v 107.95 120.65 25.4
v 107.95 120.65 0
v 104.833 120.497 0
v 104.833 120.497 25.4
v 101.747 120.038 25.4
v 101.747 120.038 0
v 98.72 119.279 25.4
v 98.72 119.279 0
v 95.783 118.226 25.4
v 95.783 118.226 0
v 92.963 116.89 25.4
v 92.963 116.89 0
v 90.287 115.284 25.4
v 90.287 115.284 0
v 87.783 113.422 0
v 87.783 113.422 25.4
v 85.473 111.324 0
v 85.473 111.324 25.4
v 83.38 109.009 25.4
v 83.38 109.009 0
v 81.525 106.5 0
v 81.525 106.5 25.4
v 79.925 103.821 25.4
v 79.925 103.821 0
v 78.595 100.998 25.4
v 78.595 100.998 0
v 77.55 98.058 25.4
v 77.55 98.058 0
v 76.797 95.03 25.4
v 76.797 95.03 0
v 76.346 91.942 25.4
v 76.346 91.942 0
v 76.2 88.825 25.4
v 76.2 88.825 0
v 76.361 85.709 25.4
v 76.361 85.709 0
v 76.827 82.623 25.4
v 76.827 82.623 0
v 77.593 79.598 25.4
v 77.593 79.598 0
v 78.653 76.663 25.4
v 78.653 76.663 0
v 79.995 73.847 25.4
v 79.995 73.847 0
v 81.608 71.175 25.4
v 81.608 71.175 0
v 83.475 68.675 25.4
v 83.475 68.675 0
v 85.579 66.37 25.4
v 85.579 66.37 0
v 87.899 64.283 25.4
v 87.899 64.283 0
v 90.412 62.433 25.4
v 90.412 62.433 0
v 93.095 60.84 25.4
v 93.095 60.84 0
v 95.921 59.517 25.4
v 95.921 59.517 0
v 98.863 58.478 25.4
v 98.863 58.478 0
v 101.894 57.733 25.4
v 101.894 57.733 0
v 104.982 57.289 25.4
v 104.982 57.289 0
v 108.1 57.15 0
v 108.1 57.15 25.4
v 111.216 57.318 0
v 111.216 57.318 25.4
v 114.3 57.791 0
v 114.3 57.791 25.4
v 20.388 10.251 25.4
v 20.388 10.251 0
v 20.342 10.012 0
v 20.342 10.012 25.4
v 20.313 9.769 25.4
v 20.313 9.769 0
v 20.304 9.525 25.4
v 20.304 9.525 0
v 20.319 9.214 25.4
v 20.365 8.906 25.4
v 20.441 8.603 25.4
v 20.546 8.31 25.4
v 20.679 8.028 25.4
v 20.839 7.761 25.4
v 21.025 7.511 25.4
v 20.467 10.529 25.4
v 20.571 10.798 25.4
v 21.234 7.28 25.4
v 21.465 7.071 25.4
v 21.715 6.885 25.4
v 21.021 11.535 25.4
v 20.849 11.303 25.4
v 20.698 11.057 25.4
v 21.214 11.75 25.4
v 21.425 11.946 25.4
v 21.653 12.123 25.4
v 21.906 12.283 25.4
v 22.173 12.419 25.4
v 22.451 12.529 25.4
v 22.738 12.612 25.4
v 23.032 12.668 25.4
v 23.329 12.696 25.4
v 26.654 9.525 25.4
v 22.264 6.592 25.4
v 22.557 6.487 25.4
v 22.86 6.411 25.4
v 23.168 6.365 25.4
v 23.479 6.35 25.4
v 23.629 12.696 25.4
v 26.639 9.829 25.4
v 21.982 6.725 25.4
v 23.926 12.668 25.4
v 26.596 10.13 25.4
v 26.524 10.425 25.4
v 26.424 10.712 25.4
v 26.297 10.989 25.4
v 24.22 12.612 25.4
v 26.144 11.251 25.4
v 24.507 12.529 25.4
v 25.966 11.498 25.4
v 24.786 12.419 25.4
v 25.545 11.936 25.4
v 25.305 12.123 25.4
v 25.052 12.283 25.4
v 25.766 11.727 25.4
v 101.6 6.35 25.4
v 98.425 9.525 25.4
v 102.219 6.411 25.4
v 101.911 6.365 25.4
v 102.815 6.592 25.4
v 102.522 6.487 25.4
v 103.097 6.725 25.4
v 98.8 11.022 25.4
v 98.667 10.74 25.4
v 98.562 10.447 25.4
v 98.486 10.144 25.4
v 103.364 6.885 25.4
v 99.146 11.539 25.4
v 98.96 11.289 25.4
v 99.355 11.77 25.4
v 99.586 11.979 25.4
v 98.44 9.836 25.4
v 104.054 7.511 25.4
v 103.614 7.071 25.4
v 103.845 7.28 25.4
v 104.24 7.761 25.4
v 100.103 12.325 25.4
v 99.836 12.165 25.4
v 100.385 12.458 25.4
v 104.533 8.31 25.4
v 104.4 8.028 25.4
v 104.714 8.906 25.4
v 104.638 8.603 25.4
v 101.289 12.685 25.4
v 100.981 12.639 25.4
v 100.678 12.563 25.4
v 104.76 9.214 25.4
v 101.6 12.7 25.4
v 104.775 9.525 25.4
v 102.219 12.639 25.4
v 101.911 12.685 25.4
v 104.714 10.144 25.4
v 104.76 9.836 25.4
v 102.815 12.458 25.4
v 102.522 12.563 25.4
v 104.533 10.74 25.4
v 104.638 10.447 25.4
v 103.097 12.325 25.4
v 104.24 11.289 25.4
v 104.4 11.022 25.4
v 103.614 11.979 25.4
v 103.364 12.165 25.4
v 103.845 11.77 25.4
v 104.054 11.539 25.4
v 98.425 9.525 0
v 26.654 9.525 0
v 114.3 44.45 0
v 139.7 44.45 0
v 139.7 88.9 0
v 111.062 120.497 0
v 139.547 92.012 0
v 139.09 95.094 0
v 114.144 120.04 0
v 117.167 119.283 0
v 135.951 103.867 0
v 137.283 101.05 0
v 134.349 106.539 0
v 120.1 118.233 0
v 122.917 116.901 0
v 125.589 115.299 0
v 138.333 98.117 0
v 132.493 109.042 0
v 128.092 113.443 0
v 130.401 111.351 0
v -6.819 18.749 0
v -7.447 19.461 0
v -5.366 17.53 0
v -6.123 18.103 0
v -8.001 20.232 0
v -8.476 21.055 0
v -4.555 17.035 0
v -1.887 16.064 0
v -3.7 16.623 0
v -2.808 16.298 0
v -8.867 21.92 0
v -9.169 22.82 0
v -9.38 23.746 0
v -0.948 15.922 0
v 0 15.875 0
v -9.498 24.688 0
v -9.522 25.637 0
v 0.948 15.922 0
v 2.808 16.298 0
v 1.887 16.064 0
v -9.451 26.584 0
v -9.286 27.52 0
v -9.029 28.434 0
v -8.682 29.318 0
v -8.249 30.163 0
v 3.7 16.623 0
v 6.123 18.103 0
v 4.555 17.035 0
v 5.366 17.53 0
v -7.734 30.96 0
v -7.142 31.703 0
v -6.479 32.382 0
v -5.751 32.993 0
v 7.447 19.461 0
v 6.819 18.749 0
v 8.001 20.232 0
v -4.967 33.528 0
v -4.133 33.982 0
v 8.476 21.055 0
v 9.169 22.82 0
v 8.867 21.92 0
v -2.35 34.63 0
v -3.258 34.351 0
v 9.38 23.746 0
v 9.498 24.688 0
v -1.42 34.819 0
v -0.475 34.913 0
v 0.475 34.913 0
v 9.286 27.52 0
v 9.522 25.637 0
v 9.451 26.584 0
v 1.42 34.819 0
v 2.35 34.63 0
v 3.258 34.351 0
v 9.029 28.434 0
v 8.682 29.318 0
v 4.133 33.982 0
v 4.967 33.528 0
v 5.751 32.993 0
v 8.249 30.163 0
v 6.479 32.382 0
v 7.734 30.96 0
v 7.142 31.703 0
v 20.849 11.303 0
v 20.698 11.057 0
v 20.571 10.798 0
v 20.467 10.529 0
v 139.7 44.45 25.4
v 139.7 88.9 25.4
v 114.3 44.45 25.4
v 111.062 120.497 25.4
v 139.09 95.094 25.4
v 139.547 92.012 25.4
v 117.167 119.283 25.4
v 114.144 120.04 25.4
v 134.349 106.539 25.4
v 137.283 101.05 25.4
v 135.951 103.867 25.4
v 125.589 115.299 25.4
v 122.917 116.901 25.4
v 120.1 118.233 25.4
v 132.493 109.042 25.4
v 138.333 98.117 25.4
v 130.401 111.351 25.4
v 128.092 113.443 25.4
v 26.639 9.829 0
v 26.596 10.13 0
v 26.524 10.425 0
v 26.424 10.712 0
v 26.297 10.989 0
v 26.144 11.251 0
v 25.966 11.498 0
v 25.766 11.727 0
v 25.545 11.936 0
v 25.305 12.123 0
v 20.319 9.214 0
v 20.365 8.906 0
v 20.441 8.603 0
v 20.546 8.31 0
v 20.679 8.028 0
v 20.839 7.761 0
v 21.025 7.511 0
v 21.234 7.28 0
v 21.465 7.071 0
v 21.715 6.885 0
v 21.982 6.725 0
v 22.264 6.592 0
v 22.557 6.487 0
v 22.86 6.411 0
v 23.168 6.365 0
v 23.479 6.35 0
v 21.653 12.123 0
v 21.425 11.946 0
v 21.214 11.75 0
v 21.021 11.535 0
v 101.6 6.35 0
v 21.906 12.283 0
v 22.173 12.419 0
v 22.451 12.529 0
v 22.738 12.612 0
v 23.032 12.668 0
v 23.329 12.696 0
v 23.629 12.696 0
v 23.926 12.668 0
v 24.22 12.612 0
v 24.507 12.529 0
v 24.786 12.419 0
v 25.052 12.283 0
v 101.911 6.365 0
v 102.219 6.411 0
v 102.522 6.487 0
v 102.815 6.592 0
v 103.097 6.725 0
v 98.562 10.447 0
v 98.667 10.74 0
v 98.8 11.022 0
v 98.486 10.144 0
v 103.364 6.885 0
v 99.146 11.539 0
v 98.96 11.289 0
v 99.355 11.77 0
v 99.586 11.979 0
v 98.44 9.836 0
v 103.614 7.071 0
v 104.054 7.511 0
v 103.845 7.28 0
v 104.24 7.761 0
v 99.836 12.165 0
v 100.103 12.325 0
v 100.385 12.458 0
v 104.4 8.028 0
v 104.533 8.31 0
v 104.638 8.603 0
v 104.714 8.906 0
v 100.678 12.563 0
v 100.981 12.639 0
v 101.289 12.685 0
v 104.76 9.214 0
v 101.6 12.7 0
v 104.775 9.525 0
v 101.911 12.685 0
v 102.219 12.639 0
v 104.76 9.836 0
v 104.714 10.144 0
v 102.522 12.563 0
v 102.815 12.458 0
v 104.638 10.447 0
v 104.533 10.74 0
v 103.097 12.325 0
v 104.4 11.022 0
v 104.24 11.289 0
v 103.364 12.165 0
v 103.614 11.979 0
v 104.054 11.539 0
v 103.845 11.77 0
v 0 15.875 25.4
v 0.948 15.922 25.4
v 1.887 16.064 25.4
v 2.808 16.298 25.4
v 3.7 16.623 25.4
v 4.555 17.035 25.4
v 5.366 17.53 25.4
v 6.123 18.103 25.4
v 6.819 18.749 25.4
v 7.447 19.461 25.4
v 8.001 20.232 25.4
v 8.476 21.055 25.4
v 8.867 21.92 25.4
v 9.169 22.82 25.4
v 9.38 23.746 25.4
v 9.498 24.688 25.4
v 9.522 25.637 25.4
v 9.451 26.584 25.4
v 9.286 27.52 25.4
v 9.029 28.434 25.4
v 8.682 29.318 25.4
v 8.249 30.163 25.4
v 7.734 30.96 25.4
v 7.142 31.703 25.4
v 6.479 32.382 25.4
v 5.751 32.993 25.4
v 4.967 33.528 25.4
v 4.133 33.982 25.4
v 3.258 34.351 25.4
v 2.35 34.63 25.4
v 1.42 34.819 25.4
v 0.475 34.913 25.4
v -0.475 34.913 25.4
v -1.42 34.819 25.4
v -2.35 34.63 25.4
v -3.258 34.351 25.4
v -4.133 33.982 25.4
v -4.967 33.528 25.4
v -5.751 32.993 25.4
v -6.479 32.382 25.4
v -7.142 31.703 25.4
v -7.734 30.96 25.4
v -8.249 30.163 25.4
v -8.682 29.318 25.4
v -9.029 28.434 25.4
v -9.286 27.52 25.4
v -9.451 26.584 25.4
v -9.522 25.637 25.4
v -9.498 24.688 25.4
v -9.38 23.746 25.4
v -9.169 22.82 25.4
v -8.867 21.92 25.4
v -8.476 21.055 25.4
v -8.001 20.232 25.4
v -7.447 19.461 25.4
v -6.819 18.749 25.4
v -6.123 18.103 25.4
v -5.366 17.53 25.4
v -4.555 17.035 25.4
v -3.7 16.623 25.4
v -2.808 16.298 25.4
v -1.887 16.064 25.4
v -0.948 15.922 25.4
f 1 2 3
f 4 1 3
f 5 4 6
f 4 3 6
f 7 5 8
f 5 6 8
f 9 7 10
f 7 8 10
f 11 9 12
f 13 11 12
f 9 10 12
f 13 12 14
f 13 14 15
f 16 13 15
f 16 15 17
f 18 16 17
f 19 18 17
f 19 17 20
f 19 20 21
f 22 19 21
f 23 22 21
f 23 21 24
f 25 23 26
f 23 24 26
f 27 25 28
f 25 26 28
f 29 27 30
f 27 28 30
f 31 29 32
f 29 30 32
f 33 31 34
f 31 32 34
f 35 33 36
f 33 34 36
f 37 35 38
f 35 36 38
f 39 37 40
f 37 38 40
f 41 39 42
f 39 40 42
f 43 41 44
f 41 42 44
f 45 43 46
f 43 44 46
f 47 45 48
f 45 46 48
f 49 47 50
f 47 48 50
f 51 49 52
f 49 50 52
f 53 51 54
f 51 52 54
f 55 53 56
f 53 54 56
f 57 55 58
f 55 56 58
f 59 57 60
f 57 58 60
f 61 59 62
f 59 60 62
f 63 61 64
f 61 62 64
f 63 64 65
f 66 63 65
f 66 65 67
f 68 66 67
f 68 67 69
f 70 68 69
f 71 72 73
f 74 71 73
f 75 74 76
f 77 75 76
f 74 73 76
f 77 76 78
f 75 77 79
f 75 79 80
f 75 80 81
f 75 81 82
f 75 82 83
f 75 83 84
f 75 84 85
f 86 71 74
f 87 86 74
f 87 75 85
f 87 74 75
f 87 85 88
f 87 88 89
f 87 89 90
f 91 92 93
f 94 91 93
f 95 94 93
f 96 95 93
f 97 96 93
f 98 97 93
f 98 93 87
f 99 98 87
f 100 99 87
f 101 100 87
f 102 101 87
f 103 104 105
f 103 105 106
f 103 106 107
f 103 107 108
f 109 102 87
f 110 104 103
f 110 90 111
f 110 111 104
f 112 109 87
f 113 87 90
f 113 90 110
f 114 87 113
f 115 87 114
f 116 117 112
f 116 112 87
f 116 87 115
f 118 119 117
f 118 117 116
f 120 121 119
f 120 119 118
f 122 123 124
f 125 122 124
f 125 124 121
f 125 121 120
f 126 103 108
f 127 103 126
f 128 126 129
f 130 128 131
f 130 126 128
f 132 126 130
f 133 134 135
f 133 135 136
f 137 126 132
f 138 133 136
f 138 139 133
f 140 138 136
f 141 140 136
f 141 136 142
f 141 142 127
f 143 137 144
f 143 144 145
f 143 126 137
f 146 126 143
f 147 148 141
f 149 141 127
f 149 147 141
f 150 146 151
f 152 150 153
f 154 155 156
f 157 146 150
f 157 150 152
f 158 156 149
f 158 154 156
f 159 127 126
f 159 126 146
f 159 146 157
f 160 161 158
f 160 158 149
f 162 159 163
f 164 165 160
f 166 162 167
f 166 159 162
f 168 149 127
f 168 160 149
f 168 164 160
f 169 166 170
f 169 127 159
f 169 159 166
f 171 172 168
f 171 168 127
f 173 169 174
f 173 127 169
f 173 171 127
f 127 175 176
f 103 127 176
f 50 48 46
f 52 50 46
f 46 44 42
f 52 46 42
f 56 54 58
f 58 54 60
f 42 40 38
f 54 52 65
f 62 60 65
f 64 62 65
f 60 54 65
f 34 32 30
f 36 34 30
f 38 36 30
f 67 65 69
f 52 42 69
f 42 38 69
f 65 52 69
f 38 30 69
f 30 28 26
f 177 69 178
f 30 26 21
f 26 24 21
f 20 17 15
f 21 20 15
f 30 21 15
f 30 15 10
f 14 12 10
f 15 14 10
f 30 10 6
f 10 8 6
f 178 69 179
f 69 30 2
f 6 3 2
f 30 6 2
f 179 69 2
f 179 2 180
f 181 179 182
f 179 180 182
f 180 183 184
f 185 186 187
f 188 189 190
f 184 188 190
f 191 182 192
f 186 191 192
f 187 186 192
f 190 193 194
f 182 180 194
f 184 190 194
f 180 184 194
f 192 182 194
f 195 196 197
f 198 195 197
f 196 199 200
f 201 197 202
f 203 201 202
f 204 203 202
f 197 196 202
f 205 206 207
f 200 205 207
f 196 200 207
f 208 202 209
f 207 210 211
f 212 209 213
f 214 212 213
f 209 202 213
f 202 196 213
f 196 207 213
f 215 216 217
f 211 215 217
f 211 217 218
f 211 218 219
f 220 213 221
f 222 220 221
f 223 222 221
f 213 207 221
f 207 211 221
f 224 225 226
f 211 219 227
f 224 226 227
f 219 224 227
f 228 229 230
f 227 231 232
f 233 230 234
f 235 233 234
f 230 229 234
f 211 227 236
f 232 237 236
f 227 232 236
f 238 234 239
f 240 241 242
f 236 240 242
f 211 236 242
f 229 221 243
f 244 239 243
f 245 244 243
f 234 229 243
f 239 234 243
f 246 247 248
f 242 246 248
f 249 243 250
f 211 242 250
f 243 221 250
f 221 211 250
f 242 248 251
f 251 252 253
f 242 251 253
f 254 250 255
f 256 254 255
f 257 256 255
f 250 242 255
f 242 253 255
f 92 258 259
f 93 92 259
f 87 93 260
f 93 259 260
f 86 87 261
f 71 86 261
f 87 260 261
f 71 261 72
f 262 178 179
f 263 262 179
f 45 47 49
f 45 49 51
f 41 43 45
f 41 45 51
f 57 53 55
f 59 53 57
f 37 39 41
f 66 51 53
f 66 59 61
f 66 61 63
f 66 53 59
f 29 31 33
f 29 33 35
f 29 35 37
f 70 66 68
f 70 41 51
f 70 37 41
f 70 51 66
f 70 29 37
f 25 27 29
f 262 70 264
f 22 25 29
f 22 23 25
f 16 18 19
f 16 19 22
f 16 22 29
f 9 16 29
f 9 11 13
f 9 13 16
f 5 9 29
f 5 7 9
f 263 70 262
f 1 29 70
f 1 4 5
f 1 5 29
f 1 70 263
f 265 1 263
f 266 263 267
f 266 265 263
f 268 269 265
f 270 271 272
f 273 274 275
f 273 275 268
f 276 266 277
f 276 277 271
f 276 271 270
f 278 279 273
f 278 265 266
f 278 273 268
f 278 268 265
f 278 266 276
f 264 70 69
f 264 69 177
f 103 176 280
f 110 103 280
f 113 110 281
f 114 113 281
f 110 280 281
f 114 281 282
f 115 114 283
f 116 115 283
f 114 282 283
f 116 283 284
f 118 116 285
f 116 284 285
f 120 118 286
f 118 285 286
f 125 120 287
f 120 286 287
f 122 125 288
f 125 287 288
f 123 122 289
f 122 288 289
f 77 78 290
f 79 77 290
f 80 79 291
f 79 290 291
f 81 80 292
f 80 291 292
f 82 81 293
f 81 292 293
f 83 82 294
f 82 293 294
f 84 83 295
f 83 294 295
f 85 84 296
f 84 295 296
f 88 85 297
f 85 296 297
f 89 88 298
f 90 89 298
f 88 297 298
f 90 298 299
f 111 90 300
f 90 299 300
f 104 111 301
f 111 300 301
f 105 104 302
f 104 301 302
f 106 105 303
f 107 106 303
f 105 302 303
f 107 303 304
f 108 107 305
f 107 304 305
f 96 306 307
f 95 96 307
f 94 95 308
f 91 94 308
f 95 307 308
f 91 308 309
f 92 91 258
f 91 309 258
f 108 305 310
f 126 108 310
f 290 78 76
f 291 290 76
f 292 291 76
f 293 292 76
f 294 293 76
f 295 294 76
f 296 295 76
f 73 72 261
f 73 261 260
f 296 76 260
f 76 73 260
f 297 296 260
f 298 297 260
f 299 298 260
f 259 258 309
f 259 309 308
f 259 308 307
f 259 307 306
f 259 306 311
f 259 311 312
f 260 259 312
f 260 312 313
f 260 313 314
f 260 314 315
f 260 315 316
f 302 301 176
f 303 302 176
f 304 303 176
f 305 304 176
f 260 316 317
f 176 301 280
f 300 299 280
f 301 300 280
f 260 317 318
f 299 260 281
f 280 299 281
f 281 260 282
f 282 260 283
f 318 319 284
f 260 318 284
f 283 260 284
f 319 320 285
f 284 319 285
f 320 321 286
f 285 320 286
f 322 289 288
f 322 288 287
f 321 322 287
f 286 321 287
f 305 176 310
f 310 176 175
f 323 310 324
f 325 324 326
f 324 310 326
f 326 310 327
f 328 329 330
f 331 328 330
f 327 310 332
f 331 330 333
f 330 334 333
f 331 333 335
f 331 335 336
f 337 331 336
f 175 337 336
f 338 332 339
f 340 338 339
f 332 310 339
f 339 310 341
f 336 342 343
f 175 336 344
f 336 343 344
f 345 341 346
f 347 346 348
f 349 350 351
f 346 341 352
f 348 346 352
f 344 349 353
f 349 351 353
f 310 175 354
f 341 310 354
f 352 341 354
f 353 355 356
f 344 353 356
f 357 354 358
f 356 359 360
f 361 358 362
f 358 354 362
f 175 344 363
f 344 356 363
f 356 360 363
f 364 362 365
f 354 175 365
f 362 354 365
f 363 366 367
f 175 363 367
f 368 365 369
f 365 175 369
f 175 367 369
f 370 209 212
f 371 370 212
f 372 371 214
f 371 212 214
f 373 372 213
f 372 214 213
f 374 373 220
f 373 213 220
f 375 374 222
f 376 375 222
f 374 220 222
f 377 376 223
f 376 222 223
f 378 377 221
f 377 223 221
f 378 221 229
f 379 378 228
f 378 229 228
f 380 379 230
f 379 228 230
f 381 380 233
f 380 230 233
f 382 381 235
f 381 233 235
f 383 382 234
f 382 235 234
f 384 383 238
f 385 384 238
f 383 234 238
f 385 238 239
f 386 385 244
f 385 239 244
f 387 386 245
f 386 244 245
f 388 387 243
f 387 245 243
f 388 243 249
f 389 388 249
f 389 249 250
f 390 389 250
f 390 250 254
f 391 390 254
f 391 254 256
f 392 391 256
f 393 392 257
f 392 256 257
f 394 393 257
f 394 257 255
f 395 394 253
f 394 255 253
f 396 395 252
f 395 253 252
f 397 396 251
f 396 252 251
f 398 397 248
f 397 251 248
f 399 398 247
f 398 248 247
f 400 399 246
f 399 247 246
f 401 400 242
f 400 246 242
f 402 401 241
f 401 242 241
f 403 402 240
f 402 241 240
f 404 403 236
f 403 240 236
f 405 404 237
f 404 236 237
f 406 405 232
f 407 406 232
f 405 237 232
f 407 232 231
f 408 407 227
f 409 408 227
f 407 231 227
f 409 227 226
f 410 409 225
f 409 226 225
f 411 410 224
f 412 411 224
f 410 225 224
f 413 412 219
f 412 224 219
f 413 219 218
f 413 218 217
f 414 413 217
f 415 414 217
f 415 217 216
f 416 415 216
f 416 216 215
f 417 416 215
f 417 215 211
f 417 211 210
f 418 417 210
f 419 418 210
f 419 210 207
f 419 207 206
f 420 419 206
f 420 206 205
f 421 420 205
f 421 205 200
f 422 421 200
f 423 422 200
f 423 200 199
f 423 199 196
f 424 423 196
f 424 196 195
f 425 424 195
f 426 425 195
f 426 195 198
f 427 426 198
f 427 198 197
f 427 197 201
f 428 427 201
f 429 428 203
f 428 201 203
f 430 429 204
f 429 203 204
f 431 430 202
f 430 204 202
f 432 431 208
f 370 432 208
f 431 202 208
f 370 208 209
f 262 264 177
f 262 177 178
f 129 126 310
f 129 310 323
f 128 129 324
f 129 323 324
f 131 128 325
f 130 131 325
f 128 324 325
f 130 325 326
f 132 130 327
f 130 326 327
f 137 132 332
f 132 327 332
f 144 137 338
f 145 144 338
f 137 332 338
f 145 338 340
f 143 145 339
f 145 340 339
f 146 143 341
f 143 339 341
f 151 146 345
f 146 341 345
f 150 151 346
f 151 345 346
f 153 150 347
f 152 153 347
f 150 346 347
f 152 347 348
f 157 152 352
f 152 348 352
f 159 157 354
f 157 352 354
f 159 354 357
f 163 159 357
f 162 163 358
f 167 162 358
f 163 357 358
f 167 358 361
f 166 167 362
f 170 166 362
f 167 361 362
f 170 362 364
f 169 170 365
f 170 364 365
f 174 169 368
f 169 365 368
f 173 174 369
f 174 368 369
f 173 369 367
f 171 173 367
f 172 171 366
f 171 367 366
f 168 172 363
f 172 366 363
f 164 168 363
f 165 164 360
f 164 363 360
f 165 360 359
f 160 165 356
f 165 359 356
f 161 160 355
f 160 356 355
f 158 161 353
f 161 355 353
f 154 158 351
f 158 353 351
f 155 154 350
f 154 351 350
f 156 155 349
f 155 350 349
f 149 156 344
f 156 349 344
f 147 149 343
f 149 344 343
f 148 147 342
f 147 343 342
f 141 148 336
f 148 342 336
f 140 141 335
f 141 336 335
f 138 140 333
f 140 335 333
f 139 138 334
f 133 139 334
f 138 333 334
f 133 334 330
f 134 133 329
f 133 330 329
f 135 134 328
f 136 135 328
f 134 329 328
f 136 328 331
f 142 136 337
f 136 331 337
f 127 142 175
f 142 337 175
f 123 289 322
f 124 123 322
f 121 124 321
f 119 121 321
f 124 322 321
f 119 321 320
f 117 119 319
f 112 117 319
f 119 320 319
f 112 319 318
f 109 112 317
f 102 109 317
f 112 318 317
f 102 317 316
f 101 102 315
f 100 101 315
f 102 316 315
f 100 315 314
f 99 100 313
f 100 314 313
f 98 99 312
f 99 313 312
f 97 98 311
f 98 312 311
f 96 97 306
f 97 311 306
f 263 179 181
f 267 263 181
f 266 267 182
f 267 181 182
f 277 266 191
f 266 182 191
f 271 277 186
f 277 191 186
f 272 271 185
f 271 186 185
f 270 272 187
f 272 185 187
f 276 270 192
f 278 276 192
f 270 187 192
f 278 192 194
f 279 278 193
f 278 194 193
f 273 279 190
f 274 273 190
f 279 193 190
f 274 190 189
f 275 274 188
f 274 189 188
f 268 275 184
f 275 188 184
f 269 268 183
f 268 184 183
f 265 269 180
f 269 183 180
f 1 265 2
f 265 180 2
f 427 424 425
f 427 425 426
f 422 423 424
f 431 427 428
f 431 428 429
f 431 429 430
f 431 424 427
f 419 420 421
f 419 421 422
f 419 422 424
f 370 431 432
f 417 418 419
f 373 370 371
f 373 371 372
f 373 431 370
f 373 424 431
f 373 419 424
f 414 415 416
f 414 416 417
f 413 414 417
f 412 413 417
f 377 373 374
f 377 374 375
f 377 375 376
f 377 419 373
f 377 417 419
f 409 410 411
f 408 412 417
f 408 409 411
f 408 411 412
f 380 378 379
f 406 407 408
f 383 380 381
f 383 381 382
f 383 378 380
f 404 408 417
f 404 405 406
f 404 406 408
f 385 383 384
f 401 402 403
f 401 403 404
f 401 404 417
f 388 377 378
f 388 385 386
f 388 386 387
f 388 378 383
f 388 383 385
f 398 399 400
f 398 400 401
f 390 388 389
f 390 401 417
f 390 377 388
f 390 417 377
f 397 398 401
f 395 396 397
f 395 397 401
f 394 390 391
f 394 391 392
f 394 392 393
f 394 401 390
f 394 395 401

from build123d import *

# Parameters (mm, degrees)
F1_DEPTH = 25.4


with BuildPart() as f1:
    # F0 (on Top) → F1 (new body)
    with BuildSketch(Plane.XY):
        with BuildLine():
            ThreePointArc((9.525, 25.4), (-6.7351920908, 32.1351920908), (0, 15.875))
            ThreePointArc((0, 15.875), (6.7351920908, 18.6648079092), (9.525, 25.4))
        make_face()
    extrude(amount=F1_DEPTH)


with BuildPart() as f1b:
    # F0 (on Top) → F1, piece 2 (new body)
    with BuildSketch(Plane.XY):
        with BuildLine():
            Line((23.4790491443, 6.35), (101.6, 6.35))
            ThreePointArc((101.6, 6.35), (99.3549359697, 7.2799359697), (98.425, 9.525))
            Line((98.425, 9.525), (26.6540491479, 9.525))
            ThreePointArc((26.6540491479, 9.525), (25.7241131769, 7.2799359685), (23.4790491443, 6.35))
        make_face()
        with BuildLine():
            ThreePointArc((98.425, 9.525), (99.3549359697, 7.2799359697), (101.6, 6.35))
            Line((101.6, 6.35), (101.6, 9.525))
            Line((101.6, 9.525), (98.425, 9.525))
        make_face()
        with BuildLine():
            Line((101.6, 9.525), (101.6, 6.35))
            ThreePointArc((101.6, 6.35), (103.8450640303, 7.2799359697), (104.775, 9.525))
            ThreePointArc((104.775, 9.525), (101.6, 12.7), (98.425, 9.525))
            Line((98.425, 9.525), (101.6, 9.525))
        make_face()
        with BuildLine():
            ThreePointArc((20.3040491479, 9.525), (21.2339851164, 7.279935971), (23.4790491443, 6.35))
            ThreePointArc((23.4790491443, 6.35), (25.7241131769, 7.2799359685), (26.6540491479, 9.525))
            Line((26.6540491479, 9.525), (21.6534588964, 9.525))
            Line((21.6534588964, 9.525), (20.3040491479, 9.525))
        make_face()
        with BuildLine():
            ThreePointArc((20.3882761834, 10.2514623059), (20.3251761985, 9.8906643527), (20.3040491479, 9.525))
            Line((20.3040491479, 9.525), (21.6534588964, 9.525))
            Line((21.6534588964, 9.525), (21.6534588964, 12.1226614933))
            Line((21.6534588964, 12.1226614933), (21.0208675399, 11.1870618996))
            Line((21.0208675399, 11.1870618996), (20.3882761834, 10.2514623059))
        make_face()
        with BuildLine():
            Line((21.6534588964, 9.525), (26.6540491479, 9.525))
            ThreePointArc((26.6540491479, 9.525), (26.2965723553, 10.9886215275), (25.3046393994, 12.1226614933))
            Line((25.3046393994, 12.1226614933), (21.6534588964, 12.1226614933))
            Line((21.6534588964, 12.1226614933), (21.6534588964, 9.525))
        make_face()
        with BuildLine():
            ThreePointArc((20.848839381, 11.3033761082), (20.5706060051, 10.7984141058), (20.3882761834, 10.2514623059))
            Line((20.3882761834, 10.2514623059), (21.0208675399, 11.1870618996))
            Line((21.0208675399, 11.1870618996), (20.848839381, 11.3033761082))
        make_face()
        with BuildLine():
            Line((21.6534588964, 12.1226614933), (25.3046393994, 12.1226614933))
            ThreePointArc((25.3046393994, 12.1226614933), (23.4790491479, 12.7), (21.6534588964, 12.1226614933))
        make_face()
        with BuildLine():
            Line((21.0208675399, 11.1870618996), (21.6534588964, 12.1226614933))
            ThreePointArc((21.6534588964, 12.1226614933), (21.2138017913, 11.7496976005), (20.848839381, 11.3033761082))
            Line((20.848839381, 11.3033761082), (21.0208675399, 11.1870618996))
        make_face()
    extrude(amount=F1_DEPTH)


with BuildPart() as f1c:
    # F0 (on Top) → F1, piece 3 (new body)
    with BuildSketch(Plane.XY):
        with BuildLine():
            Line((114.3, 44.45), (139.7, 44.45))
            Line((139.7, 44.45), (139.7, 76.2))
            Line((139.7, 76.2), (139.7, 82.55))
            Line((139.7, 82.55), (139.0585197333, 82.55))
            ThreePointArc((139.0585197333, 82.55), (130.4006403027, 66.4493596973), (114.3, 57.7914802667))
            Line((114.3, 57.7914802667), (114.3, 44.45))
        make_face()
        with BuildLine():
            Line((139.0585197333, 82.55), (139.7, 82.55))
            Line((139.7, 82.55), (139.7, 88.9))
            ThreePointArc((139.7, 88.9), (139.5392228579, 85.7088404563), (139.0585197333, 82.55))
        make_face()
        with BuildLine():
            Line((114.3, 82.55), (114.3, 57.7914802667))
            ThreePointArc((114.3, 57.7914802667), (130.4006403027, 66.4493596973), (139.0585197333, 82.55))
            Line((139.0585197333, 82.55), (114.3, 82.55))
        make_face()
        with BuildLine():
            ThreePointArc((107.95, 120.65), (76.3607771421, 85.7088404563), (114.3, 57.7914802667))
            Line((114.3, 57.7914802667), (114.3, 82.55))
            Line((114.3, 82.55), (139.0585197333, 82.55))
            ThreePointArc((139.0585197333, 82.55), (139.5392228579, 85.7088404563), (139.7, 88.9))
            Line((139.7, 88.9), (107.95, 88.9))
            Line((107.95, 88.9), (107.95, 120.65))
        make_face()
        with BuildLine():
            Line((107.95, 88.9), (139.7, 88.9))
            ThreePointArc((139.7, 88.9), (130.4006403027, 111.3506403027), (107.95, 120.65))
            Line((107.95, 120.65), (107.95, 88.9))
        make_face()
    extrude(amount=F1_DEPTH)


solid = Compound([f1.part, f1b.part, f1c.part])
